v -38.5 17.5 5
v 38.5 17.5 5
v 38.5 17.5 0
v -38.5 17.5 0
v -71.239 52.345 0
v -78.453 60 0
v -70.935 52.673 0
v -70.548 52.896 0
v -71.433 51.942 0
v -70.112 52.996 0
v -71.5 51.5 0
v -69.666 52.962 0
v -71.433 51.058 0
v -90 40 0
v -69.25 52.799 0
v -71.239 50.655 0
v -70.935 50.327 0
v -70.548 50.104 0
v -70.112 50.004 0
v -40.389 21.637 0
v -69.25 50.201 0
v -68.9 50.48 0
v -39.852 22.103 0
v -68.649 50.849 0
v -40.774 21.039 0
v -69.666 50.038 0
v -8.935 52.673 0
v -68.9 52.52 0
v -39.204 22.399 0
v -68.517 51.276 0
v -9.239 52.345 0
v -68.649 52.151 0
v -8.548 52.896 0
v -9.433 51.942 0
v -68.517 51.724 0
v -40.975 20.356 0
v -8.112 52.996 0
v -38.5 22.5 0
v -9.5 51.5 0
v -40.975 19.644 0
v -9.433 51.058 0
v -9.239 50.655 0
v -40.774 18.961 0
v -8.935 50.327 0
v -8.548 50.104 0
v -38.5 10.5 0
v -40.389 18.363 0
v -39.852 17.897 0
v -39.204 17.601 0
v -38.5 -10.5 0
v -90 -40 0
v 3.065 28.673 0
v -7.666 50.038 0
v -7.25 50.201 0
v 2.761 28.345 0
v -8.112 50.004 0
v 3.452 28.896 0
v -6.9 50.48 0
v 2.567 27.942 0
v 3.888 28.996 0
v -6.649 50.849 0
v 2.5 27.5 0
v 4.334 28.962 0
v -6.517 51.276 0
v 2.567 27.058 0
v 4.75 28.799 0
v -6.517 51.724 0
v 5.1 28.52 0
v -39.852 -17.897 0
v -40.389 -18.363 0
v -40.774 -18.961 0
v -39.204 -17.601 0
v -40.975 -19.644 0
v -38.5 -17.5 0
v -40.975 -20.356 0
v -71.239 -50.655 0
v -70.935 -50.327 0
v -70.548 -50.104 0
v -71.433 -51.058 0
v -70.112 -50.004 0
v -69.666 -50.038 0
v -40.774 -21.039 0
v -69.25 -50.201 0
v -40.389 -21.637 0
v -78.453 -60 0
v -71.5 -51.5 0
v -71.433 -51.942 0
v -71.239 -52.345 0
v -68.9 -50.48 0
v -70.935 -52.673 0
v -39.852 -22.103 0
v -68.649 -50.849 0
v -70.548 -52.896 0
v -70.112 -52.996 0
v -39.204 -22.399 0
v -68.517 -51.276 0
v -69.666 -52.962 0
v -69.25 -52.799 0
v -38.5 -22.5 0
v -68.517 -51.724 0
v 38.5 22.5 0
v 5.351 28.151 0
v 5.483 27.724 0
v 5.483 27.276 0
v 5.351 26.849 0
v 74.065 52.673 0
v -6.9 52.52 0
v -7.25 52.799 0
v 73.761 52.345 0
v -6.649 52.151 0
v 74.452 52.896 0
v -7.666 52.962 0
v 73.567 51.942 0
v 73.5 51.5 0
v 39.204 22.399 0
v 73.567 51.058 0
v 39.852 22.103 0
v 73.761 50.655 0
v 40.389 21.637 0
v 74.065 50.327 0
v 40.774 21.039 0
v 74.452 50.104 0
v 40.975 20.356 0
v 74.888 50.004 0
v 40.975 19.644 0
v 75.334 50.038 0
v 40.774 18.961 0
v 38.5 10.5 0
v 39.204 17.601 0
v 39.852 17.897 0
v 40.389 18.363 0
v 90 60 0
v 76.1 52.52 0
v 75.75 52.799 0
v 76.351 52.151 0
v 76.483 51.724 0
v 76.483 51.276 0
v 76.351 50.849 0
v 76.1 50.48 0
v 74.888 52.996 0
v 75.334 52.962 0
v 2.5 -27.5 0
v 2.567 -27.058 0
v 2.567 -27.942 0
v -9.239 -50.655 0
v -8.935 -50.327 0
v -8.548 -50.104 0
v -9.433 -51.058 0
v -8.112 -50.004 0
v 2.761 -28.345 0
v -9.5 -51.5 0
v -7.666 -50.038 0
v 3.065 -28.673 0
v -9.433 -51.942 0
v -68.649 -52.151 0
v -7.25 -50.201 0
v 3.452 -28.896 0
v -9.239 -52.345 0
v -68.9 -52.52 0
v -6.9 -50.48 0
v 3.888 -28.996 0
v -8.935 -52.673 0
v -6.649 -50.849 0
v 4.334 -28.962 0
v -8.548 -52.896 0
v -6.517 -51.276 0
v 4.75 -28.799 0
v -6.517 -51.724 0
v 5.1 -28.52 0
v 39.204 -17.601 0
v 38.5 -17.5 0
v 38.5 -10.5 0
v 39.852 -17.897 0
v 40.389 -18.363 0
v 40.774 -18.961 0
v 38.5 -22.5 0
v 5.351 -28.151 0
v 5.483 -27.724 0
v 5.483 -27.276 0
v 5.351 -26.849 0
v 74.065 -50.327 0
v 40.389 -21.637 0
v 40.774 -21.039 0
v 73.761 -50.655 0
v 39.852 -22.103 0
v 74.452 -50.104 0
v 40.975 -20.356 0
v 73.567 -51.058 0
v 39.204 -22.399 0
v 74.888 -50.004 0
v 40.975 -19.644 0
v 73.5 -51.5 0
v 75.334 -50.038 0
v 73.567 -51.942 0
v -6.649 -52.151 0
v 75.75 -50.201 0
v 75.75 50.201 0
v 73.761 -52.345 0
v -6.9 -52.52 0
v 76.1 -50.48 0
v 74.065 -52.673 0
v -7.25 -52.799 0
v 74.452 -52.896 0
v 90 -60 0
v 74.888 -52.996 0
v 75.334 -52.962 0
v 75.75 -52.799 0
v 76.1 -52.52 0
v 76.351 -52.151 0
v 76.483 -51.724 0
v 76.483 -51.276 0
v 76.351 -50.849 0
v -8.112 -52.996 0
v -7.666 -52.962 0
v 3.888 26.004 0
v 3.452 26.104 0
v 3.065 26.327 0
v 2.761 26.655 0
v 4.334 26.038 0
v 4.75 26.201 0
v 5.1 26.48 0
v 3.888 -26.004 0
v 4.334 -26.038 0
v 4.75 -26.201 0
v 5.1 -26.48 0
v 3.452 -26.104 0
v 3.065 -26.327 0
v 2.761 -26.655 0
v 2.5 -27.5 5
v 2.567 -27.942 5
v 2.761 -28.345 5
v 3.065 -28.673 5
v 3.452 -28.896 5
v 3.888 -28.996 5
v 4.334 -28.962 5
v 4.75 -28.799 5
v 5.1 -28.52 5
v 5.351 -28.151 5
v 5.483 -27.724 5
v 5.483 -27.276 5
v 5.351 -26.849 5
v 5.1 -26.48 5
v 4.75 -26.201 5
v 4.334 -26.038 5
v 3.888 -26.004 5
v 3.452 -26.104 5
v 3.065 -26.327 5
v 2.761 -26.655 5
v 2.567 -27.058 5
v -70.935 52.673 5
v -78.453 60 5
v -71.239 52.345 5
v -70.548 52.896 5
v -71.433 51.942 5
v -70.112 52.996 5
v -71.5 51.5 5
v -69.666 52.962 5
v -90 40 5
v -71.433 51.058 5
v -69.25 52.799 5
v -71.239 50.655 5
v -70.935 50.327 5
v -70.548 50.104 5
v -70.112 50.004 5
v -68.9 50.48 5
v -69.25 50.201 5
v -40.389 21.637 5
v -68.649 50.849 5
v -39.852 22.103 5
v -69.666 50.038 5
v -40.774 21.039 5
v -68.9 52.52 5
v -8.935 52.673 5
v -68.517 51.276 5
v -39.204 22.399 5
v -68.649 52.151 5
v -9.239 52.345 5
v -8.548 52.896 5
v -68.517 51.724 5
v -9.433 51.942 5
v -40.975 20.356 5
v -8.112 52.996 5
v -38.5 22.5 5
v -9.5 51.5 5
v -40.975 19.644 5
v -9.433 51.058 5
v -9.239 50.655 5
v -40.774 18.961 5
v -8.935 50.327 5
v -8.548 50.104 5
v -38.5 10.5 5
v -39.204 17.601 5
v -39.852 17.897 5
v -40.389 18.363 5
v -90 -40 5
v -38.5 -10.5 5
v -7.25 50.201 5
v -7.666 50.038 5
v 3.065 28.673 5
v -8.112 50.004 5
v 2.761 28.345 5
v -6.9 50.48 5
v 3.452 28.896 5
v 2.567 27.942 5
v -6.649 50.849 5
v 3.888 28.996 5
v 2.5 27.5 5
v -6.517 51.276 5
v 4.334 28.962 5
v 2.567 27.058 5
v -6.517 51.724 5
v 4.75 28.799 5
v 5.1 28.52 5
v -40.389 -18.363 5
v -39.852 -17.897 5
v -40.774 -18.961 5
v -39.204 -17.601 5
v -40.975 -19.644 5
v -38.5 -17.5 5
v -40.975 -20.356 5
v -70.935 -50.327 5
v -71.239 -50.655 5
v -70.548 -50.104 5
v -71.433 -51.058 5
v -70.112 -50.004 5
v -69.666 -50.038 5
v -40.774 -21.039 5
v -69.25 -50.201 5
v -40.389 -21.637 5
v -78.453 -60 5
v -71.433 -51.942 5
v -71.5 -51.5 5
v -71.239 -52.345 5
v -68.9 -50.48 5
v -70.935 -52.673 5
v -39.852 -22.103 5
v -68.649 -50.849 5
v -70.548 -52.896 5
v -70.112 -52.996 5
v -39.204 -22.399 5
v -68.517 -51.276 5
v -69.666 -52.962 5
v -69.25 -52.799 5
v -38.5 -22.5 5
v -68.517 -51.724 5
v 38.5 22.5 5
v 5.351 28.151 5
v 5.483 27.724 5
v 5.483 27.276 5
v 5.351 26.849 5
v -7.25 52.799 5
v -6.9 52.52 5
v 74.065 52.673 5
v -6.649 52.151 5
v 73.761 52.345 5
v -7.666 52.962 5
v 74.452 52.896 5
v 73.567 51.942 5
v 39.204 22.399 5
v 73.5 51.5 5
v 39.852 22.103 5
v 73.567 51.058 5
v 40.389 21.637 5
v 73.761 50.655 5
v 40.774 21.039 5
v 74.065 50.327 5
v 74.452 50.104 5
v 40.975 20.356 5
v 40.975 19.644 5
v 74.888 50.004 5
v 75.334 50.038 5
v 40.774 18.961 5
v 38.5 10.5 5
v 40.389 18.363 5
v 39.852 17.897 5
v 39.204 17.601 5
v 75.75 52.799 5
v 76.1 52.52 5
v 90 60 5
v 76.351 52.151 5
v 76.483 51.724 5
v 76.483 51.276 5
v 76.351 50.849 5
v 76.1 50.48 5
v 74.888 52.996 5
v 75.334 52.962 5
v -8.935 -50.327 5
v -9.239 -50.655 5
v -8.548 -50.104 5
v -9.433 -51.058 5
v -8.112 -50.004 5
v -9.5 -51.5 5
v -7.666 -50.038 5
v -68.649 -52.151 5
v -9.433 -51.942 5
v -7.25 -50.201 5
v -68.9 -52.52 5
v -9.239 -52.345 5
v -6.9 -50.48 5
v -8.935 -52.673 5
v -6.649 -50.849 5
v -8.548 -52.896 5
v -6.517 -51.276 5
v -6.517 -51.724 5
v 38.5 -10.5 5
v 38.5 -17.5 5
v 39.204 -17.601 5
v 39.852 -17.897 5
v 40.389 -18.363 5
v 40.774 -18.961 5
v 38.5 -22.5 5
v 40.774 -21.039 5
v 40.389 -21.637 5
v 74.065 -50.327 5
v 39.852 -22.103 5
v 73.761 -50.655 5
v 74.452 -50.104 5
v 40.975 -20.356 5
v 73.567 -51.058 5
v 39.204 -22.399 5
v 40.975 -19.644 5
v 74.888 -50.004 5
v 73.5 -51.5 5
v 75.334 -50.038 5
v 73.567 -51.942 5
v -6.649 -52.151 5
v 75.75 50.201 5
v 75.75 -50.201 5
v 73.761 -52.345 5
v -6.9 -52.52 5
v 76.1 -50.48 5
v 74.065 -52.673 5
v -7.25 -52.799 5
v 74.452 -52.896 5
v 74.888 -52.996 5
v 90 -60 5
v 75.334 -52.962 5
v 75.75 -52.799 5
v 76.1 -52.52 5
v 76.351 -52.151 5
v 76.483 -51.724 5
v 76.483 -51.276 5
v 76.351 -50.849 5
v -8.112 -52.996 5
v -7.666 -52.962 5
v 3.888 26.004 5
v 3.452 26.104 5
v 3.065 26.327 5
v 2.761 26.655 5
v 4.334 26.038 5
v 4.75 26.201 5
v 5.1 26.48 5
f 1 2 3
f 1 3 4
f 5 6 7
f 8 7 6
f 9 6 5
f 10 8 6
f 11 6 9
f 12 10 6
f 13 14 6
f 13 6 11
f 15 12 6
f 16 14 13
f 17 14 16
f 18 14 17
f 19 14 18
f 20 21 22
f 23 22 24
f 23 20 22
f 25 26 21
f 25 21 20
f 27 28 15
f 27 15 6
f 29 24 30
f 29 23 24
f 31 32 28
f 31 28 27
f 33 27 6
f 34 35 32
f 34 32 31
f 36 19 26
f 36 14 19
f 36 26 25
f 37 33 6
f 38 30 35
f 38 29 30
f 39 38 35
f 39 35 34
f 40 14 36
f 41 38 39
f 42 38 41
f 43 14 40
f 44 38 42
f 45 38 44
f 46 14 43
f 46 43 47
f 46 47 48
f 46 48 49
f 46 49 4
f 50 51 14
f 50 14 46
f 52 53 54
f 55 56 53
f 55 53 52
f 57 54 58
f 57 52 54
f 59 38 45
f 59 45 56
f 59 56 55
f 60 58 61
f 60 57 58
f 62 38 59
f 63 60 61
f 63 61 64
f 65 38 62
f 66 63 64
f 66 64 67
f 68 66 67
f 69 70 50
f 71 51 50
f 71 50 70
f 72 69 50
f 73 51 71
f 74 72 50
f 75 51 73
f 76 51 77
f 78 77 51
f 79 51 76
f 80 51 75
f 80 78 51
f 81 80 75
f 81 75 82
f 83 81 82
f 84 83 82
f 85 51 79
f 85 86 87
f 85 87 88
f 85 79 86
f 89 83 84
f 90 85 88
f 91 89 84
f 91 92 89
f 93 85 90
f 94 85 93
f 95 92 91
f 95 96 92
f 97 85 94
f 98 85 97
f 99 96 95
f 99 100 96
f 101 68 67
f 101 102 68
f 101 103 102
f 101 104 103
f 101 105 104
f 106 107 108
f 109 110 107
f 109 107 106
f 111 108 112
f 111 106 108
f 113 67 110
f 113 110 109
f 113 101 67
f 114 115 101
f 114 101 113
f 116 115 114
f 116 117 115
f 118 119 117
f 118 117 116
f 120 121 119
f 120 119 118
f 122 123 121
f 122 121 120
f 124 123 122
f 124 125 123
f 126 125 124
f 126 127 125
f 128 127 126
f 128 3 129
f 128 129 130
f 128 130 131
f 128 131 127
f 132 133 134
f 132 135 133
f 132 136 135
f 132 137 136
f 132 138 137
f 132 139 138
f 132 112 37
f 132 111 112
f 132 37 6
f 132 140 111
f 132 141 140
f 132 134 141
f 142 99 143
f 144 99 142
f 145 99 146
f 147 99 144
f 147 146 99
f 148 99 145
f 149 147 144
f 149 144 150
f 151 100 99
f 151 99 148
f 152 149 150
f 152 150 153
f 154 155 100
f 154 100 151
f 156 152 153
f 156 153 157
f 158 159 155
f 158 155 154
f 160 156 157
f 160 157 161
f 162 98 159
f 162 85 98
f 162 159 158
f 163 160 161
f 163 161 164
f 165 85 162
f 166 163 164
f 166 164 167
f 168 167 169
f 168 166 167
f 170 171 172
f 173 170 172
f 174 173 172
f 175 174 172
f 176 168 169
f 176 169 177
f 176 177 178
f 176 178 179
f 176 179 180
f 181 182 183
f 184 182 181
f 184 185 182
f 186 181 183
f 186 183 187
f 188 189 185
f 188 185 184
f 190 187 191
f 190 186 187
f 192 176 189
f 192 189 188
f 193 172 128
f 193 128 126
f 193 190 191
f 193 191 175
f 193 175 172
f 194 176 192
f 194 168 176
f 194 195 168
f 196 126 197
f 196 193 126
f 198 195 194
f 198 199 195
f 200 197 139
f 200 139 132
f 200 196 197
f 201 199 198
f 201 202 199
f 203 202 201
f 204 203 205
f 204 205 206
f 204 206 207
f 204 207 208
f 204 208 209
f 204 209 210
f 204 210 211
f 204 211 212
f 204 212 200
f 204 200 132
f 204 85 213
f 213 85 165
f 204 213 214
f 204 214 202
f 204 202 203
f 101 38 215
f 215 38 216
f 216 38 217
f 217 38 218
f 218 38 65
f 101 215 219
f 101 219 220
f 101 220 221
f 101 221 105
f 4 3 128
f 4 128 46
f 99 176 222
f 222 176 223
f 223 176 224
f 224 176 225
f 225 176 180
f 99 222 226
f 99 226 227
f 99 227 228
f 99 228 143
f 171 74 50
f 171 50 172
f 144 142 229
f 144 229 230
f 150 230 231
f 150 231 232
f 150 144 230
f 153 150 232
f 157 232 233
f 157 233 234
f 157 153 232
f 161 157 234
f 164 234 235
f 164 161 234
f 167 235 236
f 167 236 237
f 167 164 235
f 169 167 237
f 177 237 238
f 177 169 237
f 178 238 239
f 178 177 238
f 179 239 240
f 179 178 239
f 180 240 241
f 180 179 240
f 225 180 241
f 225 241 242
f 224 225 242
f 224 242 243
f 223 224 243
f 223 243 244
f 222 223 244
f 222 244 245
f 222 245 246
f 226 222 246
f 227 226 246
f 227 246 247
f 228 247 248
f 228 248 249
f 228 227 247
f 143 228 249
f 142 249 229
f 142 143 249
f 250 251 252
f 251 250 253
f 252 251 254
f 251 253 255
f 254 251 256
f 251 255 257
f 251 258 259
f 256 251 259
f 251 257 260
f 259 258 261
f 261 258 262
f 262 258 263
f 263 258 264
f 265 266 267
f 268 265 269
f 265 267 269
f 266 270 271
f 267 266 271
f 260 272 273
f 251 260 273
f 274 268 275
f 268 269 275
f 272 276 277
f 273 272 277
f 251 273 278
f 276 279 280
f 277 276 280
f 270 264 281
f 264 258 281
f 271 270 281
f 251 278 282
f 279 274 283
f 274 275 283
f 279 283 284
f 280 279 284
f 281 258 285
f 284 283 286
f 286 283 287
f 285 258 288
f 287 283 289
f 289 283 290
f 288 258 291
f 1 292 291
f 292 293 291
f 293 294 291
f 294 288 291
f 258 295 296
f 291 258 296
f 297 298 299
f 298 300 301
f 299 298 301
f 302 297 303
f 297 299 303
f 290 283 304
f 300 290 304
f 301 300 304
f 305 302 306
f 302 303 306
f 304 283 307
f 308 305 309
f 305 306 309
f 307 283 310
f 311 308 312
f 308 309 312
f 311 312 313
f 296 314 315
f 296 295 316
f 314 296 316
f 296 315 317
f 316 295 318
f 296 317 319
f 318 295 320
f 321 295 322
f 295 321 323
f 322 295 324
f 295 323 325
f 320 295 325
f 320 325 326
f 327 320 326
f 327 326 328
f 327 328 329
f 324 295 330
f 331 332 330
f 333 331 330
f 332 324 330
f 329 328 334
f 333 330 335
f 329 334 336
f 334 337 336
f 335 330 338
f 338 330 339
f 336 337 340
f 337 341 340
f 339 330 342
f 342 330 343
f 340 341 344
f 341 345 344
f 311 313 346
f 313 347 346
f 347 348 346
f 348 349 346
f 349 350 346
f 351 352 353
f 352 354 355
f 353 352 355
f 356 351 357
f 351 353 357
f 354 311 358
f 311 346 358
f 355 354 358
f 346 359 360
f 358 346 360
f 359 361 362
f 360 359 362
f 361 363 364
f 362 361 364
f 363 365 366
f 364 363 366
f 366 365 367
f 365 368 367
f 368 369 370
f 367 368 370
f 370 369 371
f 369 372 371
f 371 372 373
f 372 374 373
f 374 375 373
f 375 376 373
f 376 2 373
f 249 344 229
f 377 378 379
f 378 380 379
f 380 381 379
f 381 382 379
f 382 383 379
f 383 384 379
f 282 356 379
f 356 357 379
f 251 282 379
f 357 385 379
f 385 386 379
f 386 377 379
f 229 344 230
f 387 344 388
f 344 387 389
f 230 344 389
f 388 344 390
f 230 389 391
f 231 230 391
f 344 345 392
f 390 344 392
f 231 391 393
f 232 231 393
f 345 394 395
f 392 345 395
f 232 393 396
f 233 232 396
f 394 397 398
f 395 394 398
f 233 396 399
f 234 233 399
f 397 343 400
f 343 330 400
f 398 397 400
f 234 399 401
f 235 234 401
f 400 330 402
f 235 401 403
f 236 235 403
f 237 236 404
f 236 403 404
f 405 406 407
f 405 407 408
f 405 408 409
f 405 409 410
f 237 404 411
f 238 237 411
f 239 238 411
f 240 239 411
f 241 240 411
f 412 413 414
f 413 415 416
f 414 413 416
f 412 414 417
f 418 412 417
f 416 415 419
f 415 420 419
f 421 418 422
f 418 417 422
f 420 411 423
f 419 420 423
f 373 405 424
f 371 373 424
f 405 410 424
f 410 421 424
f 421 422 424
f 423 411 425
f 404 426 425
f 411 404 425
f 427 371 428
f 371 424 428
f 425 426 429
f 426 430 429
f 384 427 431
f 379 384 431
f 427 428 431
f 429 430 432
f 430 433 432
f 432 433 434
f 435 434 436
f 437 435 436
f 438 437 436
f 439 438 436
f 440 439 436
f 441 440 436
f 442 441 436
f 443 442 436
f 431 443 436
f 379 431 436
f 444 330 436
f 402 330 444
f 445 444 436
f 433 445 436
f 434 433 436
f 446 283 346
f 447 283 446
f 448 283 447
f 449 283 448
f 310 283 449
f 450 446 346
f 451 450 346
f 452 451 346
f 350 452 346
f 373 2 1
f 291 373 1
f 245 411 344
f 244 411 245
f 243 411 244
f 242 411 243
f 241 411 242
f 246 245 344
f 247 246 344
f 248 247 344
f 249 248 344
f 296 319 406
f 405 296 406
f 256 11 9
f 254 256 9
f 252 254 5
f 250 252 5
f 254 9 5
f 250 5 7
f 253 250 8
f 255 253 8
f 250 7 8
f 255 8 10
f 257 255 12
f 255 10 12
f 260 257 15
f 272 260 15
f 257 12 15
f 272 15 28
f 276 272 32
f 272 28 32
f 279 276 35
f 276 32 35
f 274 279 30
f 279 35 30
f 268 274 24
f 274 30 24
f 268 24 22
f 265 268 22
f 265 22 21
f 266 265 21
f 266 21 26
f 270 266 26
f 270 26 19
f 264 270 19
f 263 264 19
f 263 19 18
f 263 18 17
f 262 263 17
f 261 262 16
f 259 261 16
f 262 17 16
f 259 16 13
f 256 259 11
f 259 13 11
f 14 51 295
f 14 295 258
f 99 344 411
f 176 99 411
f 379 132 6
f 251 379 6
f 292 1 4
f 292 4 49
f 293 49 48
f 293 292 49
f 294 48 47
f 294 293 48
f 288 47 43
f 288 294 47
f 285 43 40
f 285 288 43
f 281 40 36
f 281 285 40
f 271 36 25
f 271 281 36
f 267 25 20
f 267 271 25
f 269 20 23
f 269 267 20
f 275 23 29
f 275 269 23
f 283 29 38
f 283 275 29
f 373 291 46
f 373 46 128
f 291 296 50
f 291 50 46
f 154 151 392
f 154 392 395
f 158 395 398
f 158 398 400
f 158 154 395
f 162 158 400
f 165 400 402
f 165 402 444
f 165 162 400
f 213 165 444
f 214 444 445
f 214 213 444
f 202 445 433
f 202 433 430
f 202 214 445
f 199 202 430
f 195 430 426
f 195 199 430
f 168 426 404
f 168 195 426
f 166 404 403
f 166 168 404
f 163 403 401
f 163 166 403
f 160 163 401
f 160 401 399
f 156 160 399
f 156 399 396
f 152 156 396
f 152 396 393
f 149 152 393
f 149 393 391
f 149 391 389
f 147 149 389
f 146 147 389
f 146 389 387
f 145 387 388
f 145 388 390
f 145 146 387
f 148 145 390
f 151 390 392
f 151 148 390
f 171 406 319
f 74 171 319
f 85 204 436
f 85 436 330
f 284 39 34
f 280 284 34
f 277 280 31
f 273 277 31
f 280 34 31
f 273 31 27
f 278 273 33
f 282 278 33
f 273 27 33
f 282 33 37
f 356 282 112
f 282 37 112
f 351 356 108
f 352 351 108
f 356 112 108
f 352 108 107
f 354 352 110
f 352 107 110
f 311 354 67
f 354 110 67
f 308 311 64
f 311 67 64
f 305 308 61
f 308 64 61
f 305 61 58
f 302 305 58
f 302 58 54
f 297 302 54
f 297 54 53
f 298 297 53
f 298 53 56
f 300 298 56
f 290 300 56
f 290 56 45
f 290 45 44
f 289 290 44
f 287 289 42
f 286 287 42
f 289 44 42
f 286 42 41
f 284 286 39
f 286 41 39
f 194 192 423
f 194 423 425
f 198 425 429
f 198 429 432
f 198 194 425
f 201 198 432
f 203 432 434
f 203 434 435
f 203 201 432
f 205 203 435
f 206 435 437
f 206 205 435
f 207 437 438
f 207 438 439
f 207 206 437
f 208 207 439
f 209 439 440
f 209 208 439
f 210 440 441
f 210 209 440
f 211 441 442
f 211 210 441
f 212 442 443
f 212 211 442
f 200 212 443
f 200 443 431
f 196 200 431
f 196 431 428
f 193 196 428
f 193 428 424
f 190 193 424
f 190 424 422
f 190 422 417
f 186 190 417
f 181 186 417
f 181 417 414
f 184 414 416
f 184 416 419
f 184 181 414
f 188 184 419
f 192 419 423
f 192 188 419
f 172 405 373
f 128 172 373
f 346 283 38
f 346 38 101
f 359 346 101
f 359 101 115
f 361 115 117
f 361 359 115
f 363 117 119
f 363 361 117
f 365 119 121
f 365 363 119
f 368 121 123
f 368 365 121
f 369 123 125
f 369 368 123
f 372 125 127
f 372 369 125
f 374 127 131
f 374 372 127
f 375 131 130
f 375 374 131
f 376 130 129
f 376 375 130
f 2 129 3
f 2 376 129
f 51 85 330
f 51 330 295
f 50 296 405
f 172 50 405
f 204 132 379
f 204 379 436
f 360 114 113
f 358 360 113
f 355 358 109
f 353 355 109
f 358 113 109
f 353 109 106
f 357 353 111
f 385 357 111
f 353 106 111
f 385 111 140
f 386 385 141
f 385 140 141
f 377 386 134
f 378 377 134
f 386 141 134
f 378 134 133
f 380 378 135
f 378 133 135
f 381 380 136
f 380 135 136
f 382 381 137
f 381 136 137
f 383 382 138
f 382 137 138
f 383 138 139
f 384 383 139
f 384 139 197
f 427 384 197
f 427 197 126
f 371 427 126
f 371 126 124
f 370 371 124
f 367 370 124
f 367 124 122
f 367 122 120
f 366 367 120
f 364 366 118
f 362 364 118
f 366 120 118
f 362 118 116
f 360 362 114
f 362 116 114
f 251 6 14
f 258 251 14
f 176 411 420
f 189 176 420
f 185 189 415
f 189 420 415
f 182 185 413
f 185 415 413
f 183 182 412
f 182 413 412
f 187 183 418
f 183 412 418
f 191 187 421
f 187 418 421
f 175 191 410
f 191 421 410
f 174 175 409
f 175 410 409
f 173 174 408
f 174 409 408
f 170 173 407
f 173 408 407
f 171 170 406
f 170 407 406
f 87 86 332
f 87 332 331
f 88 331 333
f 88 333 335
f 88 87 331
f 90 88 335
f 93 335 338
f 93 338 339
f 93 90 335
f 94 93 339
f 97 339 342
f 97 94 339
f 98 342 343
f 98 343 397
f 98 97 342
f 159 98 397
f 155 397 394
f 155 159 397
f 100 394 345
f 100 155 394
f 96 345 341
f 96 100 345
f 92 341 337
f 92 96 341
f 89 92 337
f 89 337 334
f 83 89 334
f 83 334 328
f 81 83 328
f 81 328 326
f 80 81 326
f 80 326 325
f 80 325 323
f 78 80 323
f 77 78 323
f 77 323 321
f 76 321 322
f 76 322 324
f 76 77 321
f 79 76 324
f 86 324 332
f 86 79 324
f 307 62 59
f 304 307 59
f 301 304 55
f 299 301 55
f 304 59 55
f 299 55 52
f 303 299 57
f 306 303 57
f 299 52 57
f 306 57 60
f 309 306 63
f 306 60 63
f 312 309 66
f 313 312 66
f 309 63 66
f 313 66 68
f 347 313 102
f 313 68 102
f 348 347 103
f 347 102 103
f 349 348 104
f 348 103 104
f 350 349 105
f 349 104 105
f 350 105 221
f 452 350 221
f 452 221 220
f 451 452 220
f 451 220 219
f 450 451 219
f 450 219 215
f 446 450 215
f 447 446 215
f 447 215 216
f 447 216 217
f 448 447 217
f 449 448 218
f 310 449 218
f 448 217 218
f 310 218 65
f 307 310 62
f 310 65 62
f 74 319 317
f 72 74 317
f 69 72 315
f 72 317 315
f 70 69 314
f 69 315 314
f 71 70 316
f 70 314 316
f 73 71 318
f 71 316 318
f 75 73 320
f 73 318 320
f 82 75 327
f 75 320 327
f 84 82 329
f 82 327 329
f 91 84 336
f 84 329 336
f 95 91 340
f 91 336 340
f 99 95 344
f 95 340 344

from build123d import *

# Parameters (mm, degrees)
BOSS_EXTRU_1_DEPTH      = 5
ENL_V_MAT_EXTRU_1_REACH = 110.282
ESQUISSE2_W             = 77
ESQUISSE2_H             = 21
ENL_V_MAT_EXTRU_2_REACH = 110.282
ESQUISSE4_R             = 1.5
ENL_V_MAT_EXTRU_3_DEPTH = 5


with BuildPart() as part:
    # Esquisse1 → Boss.-Extru.1 (new body)
    with BuildSketch(Plane.XY):
        Polygon((-90, 0), (90, 0), (90, 60), (-78.452994616, 60), (-90, 40), align=None)
    boss_extru_1 = extrude(amount=BOSS_EXTRU_1_DEPTH)

    # Symétrie1: Boss.-Extru.1 across Top Plane
    add(boss_extru_1.mirror(Plane(origin=(0, 0, 0), x_dir=(1, 0, 0), z_dir=(0, 1, 0))))

    # Esquisse2 → Enlèv. mat.-Extru.1 (cut, up to next)
    with BuildSketch(Plane.XY.offset(5), mode=Mode.PRIVATE) as enl_v_mat_extru_1_sk1:
        Rectangle(ESQUISSE2_W, ESQUISSE2_H)
    enl_v_mat_extru_1_tool1 = extrude(enl_v_mat_extru_1_sk1.sketch, amount=-ENL_V_MAT_EXTRU_1_REACH, mode=Mode.PRIVATE) & part.part
    add(enl_v_mat_extru_1_tool1.solids().sort_by_distance((0, 0, 5))[0], mode=Mode.SUBTRACT)

    # Esquisse3 → Enlèv. mat.-Extru.2 (cut, up to next)
    with BuildSketch(Plane.XY.offset(5), mode=Mode.PRIVATE) as enl_v_mat_extru_2_sk1:
        with BuildLine():
            Line((-38.5, 22.5), (38.5, 22.5))
            ThreePointArc((38.5, 22.5), (41, 20), (38.5, 17.5))
            Line((38.5, 17.5), (-38.5, 17.5))
            ThreePointArc((-38.5, 17.5), (-41, 20), (-38.5, 22.5))
        make_face()
    enl_v_mat_extru_2_tool1 = extrude(enl_v_mat_extru_2_sk1.sketch, amount=-ENL_V_MAT_EXTRU_2_REACH, mode=Mode.PRIVATE) & part.part
    enl_v_mat_extru_2 = enl_v_mat_extru_2_tool1.solids().sort_by_distance((0, 20, 5))[0]
    add(enl_v_mat_extru_2, mode=Mode.SUBTRACT)

    # Esquisse4 → Enlèv. mat.-Extru.3 (cut)
    with BuildSketch(Plane(origin=(0, 0, 0), x_dir=(-1, 0, 0), z_dir=(0, 0, -1))):
        with Locations((-75, 51.5)):
            Circle(ESQUISSE4_R)
        with Locations((8, 51.5)):
            Circle(ESQUISSE4_R)
        with Locations((70, 51.5)):
            Circle(ESQUISSE4_R)
        with Locations((-4, 27.5)):
            Circle(ESQUISSE4_R)
    enl_v_mat_extru_3 = extrude(amount=-ENL_V_MAT_EXTRU_3_DEPTH, mode=Mode.SUBTRACT)

    # Symétrie2: Enlèv. mat.-Extru.3 across plane
    add(enl_v_mat_extru_3.mirror(Plane.ZX), mode=Mode.SUBTRACT)

    # Symétrie3: Enlèv. mat.-Extru.2 across plane
    add(enl_v_mat_extru_2.mirror(Plane.ZX), mode=Mode.SUBTRACT)


solid = part.part
